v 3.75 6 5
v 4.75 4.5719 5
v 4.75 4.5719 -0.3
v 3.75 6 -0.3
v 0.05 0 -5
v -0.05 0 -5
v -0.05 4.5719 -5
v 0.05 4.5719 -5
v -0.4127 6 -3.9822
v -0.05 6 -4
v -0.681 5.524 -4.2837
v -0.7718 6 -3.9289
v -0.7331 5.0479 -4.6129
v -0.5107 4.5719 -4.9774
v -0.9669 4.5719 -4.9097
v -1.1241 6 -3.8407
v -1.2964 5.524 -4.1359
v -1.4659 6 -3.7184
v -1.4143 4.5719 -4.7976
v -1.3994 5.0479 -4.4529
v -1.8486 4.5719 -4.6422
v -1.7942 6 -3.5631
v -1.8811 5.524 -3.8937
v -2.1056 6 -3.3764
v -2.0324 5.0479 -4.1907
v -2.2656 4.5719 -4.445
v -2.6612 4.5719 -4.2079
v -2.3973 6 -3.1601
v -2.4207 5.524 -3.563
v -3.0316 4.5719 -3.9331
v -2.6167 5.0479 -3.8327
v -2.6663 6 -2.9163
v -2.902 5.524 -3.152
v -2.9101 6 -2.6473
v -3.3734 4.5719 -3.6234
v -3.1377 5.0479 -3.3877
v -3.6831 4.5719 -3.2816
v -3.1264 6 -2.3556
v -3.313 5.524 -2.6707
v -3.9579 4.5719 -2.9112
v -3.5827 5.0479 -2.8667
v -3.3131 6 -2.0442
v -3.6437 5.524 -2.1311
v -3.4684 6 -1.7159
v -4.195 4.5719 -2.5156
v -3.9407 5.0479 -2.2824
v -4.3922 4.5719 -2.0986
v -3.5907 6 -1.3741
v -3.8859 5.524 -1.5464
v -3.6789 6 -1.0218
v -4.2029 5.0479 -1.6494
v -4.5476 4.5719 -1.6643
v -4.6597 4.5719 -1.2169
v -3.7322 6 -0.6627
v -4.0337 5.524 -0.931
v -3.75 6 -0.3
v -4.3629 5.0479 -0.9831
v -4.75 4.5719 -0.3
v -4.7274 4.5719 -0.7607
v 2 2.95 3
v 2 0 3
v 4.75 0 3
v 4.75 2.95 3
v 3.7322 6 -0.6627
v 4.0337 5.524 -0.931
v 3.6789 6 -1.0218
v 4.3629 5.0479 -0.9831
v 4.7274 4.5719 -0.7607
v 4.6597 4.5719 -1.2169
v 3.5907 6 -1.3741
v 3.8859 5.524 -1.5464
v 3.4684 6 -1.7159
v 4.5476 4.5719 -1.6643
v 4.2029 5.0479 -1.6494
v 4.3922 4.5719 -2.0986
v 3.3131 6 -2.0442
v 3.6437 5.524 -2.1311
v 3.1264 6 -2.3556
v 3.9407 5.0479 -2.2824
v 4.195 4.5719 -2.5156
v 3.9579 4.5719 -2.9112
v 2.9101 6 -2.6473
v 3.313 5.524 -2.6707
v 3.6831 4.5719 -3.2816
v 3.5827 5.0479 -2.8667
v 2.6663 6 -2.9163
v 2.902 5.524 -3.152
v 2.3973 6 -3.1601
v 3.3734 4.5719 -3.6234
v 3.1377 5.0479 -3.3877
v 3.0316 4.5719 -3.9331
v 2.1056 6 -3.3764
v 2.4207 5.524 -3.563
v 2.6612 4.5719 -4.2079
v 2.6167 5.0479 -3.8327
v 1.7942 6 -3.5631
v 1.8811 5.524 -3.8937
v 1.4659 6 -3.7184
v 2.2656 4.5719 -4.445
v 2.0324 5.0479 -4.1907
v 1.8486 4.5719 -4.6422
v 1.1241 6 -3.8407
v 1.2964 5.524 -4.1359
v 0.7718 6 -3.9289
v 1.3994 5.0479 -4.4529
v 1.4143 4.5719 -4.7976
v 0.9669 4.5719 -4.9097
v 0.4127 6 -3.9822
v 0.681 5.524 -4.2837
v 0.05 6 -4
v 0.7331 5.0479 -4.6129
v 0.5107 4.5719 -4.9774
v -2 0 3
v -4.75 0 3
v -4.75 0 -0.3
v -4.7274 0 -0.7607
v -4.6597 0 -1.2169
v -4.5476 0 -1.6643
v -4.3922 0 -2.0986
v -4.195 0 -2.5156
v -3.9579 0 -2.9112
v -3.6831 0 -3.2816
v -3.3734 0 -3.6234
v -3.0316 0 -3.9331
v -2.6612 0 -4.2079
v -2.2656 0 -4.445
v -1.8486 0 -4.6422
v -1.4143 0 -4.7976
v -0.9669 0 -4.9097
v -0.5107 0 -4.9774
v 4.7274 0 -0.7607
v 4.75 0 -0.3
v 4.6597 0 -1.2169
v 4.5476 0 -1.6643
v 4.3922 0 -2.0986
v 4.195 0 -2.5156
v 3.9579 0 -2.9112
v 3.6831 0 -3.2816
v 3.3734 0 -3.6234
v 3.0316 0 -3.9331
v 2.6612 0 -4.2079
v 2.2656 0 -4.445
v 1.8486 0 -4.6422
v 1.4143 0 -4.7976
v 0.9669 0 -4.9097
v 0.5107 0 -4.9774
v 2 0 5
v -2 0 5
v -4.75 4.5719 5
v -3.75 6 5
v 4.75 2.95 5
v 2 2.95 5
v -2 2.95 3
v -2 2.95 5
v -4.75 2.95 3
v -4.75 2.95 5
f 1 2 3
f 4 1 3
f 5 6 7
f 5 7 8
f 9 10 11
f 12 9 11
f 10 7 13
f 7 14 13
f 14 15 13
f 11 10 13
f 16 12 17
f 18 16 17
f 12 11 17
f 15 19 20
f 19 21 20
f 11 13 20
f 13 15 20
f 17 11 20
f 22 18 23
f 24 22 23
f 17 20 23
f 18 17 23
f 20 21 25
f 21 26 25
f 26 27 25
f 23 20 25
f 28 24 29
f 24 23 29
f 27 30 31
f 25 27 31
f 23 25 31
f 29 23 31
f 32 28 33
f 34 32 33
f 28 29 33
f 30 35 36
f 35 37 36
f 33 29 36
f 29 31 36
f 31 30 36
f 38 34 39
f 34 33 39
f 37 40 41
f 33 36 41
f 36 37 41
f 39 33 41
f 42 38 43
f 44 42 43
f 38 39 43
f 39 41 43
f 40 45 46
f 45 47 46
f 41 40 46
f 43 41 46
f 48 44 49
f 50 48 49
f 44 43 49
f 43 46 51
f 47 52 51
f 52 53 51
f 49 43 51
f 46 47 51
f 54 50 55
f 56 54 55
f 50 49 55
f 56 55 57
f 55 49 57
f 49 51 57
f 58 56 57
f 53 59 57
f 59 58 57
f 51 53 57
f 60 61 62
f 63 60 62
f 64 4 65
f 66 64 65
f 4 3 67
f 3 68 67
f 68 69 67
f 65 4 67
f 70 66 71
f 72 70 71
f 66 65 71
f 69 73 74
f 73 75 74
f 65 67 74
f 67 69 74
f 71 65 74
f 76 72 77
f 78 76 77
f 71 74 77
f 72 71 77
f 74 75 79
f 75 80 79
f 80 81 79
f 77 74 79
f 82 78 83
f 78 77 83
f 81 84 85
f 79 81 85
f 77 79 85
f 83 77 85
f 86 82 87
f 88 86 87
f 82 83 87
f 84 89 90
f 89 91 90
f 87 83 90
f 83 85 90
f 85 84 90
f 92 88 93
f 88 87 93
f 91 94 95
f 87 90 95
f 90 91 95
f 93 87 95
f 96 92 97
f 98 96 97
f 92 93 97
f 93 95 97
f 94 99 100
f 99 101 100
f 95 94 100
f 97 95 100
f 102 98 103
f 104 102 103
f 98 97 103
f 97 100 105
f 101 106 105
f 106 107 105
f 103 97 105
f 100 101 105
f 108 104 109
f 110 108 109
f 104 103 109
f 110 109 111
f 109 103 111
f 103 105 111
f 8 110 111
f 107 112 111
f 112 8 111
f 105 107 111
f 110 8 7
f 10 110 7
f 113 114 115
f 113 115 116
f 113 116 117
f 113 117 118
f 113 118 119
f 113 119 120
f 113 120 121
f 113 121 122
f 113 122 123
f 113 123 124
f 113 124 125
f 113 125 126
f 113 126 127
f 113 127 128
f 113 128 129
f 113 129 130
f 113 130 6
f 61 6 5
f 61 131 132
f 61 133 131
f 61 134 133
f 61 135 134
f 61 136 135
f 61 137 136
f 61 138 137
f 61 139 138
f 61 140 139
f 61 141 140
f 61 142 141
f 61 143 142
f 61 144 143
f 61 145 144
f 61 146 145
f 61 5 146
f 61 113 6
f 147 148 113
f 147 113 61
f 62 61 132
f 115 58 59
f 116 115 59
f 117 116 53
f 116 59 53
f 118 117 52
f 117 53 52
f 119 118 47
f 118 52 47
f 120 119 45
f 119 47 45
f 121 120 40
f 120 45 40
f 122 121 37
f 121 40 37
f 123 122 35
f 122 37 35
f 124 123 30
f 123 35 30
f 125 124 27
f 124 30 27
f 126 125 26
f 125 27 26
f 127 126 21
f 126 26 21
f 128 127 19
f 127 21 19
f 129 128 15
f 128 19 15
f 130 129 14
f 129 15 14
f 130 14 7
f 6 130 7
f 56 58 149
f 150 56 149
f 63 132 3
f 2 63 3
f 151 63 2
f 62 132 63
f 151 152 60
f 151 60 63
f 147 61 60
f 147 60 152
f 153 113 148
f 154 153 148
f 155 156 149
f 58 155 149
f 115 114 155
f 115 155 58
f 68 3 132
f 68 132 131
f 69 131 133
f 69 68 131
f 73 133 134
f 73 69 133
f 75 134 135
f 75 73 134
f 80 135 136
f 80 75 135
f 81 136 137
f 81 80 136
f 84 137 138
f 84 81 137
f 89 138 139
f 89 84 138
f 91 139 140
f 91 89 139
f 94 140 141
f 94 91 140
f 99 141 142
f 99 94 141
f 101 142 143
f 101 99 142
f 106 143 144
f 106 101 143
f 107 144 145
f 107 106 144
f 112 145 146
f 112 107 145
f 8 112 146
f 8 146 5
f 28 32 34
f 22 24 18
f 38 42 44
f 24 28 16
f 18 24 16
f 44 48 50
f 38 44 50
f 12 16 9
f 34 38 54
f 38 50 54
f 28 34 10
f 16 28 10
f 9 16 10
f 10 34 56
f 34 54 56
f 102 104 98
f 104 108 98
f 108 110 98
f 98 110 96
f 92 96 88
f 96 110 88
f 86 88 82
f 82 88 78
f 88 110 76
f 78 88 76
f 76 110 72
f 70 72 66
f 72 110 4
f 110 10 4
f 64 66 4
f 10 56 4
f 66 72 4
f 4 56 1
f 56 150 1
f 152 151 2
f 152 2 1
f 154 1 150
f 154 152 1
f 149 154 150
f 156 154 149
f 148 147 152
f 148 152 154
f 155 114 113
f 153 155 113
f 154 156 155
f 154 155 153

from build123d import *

# Parameters (mm, degrees)
F0_W     = 2.75
F0_H     = 2
F1_DEPTH = 6
F2_DEPTH = 2.95
F3_R     = 4.7
F4_SIZE2 = 1.4281480067
F4_SIZE  = 1


with BuildPart() as f1:
    # F0 (on Front) → F1 (new body)
    with BuildSketch(Plane.XZ):
        with Locations((3.375, 4)):
            Rectangle(F0_W, F0_H)
        Polygon((2, 3), (2, 5), (0, 5), (-2, 5), (-2, 3), align=None)
        Polygon((4.75, -5), (4.75, 3), (2, 3), (-2, 3), (-4.75, 3), (-4.75, -5), align=None)
        with Locations((-3.375, 4)):
            Rectangle(F0_W, F0_H)
    extrude(amount=-F1_DEPTH)

    # F0 (on Front) → F2 (cut)
    with BuildSketch(Plane.XZ):
        with Locations((-3.375, 4)):
            Rectangle(F0_W, F0_H)
        with Locations((3.375, 4)):
            Rectangle(F0_W, F0_H)
    extrude(amount=-F2_DEPTH, mode=Mode.SUBTRACT)

    # F3
    f3_edges = [f1.edges().sort_by_distance(p)[0] for p in [
        (-4.75, 3, -5),
        (4.75, 3, -5),
    ]]
    fillet(f3_edges, radius=F3_R)

    # F4
    f4_edges = [f1.edges().sort_by_distance(p)[0] for p in [
        (3.373402, 6, -3.623402),
        (-3.373402, 6, -3.623402),
        (0, 6, -5),
    ]]
    f4_side = f1.faces().sort_by_distance((0, 6, 0.437938))[0]
    chamfer(f4_edges, length=F4_SIZE, length2=F4_SIZE2, reference=f4_side)


solid = f1.part
